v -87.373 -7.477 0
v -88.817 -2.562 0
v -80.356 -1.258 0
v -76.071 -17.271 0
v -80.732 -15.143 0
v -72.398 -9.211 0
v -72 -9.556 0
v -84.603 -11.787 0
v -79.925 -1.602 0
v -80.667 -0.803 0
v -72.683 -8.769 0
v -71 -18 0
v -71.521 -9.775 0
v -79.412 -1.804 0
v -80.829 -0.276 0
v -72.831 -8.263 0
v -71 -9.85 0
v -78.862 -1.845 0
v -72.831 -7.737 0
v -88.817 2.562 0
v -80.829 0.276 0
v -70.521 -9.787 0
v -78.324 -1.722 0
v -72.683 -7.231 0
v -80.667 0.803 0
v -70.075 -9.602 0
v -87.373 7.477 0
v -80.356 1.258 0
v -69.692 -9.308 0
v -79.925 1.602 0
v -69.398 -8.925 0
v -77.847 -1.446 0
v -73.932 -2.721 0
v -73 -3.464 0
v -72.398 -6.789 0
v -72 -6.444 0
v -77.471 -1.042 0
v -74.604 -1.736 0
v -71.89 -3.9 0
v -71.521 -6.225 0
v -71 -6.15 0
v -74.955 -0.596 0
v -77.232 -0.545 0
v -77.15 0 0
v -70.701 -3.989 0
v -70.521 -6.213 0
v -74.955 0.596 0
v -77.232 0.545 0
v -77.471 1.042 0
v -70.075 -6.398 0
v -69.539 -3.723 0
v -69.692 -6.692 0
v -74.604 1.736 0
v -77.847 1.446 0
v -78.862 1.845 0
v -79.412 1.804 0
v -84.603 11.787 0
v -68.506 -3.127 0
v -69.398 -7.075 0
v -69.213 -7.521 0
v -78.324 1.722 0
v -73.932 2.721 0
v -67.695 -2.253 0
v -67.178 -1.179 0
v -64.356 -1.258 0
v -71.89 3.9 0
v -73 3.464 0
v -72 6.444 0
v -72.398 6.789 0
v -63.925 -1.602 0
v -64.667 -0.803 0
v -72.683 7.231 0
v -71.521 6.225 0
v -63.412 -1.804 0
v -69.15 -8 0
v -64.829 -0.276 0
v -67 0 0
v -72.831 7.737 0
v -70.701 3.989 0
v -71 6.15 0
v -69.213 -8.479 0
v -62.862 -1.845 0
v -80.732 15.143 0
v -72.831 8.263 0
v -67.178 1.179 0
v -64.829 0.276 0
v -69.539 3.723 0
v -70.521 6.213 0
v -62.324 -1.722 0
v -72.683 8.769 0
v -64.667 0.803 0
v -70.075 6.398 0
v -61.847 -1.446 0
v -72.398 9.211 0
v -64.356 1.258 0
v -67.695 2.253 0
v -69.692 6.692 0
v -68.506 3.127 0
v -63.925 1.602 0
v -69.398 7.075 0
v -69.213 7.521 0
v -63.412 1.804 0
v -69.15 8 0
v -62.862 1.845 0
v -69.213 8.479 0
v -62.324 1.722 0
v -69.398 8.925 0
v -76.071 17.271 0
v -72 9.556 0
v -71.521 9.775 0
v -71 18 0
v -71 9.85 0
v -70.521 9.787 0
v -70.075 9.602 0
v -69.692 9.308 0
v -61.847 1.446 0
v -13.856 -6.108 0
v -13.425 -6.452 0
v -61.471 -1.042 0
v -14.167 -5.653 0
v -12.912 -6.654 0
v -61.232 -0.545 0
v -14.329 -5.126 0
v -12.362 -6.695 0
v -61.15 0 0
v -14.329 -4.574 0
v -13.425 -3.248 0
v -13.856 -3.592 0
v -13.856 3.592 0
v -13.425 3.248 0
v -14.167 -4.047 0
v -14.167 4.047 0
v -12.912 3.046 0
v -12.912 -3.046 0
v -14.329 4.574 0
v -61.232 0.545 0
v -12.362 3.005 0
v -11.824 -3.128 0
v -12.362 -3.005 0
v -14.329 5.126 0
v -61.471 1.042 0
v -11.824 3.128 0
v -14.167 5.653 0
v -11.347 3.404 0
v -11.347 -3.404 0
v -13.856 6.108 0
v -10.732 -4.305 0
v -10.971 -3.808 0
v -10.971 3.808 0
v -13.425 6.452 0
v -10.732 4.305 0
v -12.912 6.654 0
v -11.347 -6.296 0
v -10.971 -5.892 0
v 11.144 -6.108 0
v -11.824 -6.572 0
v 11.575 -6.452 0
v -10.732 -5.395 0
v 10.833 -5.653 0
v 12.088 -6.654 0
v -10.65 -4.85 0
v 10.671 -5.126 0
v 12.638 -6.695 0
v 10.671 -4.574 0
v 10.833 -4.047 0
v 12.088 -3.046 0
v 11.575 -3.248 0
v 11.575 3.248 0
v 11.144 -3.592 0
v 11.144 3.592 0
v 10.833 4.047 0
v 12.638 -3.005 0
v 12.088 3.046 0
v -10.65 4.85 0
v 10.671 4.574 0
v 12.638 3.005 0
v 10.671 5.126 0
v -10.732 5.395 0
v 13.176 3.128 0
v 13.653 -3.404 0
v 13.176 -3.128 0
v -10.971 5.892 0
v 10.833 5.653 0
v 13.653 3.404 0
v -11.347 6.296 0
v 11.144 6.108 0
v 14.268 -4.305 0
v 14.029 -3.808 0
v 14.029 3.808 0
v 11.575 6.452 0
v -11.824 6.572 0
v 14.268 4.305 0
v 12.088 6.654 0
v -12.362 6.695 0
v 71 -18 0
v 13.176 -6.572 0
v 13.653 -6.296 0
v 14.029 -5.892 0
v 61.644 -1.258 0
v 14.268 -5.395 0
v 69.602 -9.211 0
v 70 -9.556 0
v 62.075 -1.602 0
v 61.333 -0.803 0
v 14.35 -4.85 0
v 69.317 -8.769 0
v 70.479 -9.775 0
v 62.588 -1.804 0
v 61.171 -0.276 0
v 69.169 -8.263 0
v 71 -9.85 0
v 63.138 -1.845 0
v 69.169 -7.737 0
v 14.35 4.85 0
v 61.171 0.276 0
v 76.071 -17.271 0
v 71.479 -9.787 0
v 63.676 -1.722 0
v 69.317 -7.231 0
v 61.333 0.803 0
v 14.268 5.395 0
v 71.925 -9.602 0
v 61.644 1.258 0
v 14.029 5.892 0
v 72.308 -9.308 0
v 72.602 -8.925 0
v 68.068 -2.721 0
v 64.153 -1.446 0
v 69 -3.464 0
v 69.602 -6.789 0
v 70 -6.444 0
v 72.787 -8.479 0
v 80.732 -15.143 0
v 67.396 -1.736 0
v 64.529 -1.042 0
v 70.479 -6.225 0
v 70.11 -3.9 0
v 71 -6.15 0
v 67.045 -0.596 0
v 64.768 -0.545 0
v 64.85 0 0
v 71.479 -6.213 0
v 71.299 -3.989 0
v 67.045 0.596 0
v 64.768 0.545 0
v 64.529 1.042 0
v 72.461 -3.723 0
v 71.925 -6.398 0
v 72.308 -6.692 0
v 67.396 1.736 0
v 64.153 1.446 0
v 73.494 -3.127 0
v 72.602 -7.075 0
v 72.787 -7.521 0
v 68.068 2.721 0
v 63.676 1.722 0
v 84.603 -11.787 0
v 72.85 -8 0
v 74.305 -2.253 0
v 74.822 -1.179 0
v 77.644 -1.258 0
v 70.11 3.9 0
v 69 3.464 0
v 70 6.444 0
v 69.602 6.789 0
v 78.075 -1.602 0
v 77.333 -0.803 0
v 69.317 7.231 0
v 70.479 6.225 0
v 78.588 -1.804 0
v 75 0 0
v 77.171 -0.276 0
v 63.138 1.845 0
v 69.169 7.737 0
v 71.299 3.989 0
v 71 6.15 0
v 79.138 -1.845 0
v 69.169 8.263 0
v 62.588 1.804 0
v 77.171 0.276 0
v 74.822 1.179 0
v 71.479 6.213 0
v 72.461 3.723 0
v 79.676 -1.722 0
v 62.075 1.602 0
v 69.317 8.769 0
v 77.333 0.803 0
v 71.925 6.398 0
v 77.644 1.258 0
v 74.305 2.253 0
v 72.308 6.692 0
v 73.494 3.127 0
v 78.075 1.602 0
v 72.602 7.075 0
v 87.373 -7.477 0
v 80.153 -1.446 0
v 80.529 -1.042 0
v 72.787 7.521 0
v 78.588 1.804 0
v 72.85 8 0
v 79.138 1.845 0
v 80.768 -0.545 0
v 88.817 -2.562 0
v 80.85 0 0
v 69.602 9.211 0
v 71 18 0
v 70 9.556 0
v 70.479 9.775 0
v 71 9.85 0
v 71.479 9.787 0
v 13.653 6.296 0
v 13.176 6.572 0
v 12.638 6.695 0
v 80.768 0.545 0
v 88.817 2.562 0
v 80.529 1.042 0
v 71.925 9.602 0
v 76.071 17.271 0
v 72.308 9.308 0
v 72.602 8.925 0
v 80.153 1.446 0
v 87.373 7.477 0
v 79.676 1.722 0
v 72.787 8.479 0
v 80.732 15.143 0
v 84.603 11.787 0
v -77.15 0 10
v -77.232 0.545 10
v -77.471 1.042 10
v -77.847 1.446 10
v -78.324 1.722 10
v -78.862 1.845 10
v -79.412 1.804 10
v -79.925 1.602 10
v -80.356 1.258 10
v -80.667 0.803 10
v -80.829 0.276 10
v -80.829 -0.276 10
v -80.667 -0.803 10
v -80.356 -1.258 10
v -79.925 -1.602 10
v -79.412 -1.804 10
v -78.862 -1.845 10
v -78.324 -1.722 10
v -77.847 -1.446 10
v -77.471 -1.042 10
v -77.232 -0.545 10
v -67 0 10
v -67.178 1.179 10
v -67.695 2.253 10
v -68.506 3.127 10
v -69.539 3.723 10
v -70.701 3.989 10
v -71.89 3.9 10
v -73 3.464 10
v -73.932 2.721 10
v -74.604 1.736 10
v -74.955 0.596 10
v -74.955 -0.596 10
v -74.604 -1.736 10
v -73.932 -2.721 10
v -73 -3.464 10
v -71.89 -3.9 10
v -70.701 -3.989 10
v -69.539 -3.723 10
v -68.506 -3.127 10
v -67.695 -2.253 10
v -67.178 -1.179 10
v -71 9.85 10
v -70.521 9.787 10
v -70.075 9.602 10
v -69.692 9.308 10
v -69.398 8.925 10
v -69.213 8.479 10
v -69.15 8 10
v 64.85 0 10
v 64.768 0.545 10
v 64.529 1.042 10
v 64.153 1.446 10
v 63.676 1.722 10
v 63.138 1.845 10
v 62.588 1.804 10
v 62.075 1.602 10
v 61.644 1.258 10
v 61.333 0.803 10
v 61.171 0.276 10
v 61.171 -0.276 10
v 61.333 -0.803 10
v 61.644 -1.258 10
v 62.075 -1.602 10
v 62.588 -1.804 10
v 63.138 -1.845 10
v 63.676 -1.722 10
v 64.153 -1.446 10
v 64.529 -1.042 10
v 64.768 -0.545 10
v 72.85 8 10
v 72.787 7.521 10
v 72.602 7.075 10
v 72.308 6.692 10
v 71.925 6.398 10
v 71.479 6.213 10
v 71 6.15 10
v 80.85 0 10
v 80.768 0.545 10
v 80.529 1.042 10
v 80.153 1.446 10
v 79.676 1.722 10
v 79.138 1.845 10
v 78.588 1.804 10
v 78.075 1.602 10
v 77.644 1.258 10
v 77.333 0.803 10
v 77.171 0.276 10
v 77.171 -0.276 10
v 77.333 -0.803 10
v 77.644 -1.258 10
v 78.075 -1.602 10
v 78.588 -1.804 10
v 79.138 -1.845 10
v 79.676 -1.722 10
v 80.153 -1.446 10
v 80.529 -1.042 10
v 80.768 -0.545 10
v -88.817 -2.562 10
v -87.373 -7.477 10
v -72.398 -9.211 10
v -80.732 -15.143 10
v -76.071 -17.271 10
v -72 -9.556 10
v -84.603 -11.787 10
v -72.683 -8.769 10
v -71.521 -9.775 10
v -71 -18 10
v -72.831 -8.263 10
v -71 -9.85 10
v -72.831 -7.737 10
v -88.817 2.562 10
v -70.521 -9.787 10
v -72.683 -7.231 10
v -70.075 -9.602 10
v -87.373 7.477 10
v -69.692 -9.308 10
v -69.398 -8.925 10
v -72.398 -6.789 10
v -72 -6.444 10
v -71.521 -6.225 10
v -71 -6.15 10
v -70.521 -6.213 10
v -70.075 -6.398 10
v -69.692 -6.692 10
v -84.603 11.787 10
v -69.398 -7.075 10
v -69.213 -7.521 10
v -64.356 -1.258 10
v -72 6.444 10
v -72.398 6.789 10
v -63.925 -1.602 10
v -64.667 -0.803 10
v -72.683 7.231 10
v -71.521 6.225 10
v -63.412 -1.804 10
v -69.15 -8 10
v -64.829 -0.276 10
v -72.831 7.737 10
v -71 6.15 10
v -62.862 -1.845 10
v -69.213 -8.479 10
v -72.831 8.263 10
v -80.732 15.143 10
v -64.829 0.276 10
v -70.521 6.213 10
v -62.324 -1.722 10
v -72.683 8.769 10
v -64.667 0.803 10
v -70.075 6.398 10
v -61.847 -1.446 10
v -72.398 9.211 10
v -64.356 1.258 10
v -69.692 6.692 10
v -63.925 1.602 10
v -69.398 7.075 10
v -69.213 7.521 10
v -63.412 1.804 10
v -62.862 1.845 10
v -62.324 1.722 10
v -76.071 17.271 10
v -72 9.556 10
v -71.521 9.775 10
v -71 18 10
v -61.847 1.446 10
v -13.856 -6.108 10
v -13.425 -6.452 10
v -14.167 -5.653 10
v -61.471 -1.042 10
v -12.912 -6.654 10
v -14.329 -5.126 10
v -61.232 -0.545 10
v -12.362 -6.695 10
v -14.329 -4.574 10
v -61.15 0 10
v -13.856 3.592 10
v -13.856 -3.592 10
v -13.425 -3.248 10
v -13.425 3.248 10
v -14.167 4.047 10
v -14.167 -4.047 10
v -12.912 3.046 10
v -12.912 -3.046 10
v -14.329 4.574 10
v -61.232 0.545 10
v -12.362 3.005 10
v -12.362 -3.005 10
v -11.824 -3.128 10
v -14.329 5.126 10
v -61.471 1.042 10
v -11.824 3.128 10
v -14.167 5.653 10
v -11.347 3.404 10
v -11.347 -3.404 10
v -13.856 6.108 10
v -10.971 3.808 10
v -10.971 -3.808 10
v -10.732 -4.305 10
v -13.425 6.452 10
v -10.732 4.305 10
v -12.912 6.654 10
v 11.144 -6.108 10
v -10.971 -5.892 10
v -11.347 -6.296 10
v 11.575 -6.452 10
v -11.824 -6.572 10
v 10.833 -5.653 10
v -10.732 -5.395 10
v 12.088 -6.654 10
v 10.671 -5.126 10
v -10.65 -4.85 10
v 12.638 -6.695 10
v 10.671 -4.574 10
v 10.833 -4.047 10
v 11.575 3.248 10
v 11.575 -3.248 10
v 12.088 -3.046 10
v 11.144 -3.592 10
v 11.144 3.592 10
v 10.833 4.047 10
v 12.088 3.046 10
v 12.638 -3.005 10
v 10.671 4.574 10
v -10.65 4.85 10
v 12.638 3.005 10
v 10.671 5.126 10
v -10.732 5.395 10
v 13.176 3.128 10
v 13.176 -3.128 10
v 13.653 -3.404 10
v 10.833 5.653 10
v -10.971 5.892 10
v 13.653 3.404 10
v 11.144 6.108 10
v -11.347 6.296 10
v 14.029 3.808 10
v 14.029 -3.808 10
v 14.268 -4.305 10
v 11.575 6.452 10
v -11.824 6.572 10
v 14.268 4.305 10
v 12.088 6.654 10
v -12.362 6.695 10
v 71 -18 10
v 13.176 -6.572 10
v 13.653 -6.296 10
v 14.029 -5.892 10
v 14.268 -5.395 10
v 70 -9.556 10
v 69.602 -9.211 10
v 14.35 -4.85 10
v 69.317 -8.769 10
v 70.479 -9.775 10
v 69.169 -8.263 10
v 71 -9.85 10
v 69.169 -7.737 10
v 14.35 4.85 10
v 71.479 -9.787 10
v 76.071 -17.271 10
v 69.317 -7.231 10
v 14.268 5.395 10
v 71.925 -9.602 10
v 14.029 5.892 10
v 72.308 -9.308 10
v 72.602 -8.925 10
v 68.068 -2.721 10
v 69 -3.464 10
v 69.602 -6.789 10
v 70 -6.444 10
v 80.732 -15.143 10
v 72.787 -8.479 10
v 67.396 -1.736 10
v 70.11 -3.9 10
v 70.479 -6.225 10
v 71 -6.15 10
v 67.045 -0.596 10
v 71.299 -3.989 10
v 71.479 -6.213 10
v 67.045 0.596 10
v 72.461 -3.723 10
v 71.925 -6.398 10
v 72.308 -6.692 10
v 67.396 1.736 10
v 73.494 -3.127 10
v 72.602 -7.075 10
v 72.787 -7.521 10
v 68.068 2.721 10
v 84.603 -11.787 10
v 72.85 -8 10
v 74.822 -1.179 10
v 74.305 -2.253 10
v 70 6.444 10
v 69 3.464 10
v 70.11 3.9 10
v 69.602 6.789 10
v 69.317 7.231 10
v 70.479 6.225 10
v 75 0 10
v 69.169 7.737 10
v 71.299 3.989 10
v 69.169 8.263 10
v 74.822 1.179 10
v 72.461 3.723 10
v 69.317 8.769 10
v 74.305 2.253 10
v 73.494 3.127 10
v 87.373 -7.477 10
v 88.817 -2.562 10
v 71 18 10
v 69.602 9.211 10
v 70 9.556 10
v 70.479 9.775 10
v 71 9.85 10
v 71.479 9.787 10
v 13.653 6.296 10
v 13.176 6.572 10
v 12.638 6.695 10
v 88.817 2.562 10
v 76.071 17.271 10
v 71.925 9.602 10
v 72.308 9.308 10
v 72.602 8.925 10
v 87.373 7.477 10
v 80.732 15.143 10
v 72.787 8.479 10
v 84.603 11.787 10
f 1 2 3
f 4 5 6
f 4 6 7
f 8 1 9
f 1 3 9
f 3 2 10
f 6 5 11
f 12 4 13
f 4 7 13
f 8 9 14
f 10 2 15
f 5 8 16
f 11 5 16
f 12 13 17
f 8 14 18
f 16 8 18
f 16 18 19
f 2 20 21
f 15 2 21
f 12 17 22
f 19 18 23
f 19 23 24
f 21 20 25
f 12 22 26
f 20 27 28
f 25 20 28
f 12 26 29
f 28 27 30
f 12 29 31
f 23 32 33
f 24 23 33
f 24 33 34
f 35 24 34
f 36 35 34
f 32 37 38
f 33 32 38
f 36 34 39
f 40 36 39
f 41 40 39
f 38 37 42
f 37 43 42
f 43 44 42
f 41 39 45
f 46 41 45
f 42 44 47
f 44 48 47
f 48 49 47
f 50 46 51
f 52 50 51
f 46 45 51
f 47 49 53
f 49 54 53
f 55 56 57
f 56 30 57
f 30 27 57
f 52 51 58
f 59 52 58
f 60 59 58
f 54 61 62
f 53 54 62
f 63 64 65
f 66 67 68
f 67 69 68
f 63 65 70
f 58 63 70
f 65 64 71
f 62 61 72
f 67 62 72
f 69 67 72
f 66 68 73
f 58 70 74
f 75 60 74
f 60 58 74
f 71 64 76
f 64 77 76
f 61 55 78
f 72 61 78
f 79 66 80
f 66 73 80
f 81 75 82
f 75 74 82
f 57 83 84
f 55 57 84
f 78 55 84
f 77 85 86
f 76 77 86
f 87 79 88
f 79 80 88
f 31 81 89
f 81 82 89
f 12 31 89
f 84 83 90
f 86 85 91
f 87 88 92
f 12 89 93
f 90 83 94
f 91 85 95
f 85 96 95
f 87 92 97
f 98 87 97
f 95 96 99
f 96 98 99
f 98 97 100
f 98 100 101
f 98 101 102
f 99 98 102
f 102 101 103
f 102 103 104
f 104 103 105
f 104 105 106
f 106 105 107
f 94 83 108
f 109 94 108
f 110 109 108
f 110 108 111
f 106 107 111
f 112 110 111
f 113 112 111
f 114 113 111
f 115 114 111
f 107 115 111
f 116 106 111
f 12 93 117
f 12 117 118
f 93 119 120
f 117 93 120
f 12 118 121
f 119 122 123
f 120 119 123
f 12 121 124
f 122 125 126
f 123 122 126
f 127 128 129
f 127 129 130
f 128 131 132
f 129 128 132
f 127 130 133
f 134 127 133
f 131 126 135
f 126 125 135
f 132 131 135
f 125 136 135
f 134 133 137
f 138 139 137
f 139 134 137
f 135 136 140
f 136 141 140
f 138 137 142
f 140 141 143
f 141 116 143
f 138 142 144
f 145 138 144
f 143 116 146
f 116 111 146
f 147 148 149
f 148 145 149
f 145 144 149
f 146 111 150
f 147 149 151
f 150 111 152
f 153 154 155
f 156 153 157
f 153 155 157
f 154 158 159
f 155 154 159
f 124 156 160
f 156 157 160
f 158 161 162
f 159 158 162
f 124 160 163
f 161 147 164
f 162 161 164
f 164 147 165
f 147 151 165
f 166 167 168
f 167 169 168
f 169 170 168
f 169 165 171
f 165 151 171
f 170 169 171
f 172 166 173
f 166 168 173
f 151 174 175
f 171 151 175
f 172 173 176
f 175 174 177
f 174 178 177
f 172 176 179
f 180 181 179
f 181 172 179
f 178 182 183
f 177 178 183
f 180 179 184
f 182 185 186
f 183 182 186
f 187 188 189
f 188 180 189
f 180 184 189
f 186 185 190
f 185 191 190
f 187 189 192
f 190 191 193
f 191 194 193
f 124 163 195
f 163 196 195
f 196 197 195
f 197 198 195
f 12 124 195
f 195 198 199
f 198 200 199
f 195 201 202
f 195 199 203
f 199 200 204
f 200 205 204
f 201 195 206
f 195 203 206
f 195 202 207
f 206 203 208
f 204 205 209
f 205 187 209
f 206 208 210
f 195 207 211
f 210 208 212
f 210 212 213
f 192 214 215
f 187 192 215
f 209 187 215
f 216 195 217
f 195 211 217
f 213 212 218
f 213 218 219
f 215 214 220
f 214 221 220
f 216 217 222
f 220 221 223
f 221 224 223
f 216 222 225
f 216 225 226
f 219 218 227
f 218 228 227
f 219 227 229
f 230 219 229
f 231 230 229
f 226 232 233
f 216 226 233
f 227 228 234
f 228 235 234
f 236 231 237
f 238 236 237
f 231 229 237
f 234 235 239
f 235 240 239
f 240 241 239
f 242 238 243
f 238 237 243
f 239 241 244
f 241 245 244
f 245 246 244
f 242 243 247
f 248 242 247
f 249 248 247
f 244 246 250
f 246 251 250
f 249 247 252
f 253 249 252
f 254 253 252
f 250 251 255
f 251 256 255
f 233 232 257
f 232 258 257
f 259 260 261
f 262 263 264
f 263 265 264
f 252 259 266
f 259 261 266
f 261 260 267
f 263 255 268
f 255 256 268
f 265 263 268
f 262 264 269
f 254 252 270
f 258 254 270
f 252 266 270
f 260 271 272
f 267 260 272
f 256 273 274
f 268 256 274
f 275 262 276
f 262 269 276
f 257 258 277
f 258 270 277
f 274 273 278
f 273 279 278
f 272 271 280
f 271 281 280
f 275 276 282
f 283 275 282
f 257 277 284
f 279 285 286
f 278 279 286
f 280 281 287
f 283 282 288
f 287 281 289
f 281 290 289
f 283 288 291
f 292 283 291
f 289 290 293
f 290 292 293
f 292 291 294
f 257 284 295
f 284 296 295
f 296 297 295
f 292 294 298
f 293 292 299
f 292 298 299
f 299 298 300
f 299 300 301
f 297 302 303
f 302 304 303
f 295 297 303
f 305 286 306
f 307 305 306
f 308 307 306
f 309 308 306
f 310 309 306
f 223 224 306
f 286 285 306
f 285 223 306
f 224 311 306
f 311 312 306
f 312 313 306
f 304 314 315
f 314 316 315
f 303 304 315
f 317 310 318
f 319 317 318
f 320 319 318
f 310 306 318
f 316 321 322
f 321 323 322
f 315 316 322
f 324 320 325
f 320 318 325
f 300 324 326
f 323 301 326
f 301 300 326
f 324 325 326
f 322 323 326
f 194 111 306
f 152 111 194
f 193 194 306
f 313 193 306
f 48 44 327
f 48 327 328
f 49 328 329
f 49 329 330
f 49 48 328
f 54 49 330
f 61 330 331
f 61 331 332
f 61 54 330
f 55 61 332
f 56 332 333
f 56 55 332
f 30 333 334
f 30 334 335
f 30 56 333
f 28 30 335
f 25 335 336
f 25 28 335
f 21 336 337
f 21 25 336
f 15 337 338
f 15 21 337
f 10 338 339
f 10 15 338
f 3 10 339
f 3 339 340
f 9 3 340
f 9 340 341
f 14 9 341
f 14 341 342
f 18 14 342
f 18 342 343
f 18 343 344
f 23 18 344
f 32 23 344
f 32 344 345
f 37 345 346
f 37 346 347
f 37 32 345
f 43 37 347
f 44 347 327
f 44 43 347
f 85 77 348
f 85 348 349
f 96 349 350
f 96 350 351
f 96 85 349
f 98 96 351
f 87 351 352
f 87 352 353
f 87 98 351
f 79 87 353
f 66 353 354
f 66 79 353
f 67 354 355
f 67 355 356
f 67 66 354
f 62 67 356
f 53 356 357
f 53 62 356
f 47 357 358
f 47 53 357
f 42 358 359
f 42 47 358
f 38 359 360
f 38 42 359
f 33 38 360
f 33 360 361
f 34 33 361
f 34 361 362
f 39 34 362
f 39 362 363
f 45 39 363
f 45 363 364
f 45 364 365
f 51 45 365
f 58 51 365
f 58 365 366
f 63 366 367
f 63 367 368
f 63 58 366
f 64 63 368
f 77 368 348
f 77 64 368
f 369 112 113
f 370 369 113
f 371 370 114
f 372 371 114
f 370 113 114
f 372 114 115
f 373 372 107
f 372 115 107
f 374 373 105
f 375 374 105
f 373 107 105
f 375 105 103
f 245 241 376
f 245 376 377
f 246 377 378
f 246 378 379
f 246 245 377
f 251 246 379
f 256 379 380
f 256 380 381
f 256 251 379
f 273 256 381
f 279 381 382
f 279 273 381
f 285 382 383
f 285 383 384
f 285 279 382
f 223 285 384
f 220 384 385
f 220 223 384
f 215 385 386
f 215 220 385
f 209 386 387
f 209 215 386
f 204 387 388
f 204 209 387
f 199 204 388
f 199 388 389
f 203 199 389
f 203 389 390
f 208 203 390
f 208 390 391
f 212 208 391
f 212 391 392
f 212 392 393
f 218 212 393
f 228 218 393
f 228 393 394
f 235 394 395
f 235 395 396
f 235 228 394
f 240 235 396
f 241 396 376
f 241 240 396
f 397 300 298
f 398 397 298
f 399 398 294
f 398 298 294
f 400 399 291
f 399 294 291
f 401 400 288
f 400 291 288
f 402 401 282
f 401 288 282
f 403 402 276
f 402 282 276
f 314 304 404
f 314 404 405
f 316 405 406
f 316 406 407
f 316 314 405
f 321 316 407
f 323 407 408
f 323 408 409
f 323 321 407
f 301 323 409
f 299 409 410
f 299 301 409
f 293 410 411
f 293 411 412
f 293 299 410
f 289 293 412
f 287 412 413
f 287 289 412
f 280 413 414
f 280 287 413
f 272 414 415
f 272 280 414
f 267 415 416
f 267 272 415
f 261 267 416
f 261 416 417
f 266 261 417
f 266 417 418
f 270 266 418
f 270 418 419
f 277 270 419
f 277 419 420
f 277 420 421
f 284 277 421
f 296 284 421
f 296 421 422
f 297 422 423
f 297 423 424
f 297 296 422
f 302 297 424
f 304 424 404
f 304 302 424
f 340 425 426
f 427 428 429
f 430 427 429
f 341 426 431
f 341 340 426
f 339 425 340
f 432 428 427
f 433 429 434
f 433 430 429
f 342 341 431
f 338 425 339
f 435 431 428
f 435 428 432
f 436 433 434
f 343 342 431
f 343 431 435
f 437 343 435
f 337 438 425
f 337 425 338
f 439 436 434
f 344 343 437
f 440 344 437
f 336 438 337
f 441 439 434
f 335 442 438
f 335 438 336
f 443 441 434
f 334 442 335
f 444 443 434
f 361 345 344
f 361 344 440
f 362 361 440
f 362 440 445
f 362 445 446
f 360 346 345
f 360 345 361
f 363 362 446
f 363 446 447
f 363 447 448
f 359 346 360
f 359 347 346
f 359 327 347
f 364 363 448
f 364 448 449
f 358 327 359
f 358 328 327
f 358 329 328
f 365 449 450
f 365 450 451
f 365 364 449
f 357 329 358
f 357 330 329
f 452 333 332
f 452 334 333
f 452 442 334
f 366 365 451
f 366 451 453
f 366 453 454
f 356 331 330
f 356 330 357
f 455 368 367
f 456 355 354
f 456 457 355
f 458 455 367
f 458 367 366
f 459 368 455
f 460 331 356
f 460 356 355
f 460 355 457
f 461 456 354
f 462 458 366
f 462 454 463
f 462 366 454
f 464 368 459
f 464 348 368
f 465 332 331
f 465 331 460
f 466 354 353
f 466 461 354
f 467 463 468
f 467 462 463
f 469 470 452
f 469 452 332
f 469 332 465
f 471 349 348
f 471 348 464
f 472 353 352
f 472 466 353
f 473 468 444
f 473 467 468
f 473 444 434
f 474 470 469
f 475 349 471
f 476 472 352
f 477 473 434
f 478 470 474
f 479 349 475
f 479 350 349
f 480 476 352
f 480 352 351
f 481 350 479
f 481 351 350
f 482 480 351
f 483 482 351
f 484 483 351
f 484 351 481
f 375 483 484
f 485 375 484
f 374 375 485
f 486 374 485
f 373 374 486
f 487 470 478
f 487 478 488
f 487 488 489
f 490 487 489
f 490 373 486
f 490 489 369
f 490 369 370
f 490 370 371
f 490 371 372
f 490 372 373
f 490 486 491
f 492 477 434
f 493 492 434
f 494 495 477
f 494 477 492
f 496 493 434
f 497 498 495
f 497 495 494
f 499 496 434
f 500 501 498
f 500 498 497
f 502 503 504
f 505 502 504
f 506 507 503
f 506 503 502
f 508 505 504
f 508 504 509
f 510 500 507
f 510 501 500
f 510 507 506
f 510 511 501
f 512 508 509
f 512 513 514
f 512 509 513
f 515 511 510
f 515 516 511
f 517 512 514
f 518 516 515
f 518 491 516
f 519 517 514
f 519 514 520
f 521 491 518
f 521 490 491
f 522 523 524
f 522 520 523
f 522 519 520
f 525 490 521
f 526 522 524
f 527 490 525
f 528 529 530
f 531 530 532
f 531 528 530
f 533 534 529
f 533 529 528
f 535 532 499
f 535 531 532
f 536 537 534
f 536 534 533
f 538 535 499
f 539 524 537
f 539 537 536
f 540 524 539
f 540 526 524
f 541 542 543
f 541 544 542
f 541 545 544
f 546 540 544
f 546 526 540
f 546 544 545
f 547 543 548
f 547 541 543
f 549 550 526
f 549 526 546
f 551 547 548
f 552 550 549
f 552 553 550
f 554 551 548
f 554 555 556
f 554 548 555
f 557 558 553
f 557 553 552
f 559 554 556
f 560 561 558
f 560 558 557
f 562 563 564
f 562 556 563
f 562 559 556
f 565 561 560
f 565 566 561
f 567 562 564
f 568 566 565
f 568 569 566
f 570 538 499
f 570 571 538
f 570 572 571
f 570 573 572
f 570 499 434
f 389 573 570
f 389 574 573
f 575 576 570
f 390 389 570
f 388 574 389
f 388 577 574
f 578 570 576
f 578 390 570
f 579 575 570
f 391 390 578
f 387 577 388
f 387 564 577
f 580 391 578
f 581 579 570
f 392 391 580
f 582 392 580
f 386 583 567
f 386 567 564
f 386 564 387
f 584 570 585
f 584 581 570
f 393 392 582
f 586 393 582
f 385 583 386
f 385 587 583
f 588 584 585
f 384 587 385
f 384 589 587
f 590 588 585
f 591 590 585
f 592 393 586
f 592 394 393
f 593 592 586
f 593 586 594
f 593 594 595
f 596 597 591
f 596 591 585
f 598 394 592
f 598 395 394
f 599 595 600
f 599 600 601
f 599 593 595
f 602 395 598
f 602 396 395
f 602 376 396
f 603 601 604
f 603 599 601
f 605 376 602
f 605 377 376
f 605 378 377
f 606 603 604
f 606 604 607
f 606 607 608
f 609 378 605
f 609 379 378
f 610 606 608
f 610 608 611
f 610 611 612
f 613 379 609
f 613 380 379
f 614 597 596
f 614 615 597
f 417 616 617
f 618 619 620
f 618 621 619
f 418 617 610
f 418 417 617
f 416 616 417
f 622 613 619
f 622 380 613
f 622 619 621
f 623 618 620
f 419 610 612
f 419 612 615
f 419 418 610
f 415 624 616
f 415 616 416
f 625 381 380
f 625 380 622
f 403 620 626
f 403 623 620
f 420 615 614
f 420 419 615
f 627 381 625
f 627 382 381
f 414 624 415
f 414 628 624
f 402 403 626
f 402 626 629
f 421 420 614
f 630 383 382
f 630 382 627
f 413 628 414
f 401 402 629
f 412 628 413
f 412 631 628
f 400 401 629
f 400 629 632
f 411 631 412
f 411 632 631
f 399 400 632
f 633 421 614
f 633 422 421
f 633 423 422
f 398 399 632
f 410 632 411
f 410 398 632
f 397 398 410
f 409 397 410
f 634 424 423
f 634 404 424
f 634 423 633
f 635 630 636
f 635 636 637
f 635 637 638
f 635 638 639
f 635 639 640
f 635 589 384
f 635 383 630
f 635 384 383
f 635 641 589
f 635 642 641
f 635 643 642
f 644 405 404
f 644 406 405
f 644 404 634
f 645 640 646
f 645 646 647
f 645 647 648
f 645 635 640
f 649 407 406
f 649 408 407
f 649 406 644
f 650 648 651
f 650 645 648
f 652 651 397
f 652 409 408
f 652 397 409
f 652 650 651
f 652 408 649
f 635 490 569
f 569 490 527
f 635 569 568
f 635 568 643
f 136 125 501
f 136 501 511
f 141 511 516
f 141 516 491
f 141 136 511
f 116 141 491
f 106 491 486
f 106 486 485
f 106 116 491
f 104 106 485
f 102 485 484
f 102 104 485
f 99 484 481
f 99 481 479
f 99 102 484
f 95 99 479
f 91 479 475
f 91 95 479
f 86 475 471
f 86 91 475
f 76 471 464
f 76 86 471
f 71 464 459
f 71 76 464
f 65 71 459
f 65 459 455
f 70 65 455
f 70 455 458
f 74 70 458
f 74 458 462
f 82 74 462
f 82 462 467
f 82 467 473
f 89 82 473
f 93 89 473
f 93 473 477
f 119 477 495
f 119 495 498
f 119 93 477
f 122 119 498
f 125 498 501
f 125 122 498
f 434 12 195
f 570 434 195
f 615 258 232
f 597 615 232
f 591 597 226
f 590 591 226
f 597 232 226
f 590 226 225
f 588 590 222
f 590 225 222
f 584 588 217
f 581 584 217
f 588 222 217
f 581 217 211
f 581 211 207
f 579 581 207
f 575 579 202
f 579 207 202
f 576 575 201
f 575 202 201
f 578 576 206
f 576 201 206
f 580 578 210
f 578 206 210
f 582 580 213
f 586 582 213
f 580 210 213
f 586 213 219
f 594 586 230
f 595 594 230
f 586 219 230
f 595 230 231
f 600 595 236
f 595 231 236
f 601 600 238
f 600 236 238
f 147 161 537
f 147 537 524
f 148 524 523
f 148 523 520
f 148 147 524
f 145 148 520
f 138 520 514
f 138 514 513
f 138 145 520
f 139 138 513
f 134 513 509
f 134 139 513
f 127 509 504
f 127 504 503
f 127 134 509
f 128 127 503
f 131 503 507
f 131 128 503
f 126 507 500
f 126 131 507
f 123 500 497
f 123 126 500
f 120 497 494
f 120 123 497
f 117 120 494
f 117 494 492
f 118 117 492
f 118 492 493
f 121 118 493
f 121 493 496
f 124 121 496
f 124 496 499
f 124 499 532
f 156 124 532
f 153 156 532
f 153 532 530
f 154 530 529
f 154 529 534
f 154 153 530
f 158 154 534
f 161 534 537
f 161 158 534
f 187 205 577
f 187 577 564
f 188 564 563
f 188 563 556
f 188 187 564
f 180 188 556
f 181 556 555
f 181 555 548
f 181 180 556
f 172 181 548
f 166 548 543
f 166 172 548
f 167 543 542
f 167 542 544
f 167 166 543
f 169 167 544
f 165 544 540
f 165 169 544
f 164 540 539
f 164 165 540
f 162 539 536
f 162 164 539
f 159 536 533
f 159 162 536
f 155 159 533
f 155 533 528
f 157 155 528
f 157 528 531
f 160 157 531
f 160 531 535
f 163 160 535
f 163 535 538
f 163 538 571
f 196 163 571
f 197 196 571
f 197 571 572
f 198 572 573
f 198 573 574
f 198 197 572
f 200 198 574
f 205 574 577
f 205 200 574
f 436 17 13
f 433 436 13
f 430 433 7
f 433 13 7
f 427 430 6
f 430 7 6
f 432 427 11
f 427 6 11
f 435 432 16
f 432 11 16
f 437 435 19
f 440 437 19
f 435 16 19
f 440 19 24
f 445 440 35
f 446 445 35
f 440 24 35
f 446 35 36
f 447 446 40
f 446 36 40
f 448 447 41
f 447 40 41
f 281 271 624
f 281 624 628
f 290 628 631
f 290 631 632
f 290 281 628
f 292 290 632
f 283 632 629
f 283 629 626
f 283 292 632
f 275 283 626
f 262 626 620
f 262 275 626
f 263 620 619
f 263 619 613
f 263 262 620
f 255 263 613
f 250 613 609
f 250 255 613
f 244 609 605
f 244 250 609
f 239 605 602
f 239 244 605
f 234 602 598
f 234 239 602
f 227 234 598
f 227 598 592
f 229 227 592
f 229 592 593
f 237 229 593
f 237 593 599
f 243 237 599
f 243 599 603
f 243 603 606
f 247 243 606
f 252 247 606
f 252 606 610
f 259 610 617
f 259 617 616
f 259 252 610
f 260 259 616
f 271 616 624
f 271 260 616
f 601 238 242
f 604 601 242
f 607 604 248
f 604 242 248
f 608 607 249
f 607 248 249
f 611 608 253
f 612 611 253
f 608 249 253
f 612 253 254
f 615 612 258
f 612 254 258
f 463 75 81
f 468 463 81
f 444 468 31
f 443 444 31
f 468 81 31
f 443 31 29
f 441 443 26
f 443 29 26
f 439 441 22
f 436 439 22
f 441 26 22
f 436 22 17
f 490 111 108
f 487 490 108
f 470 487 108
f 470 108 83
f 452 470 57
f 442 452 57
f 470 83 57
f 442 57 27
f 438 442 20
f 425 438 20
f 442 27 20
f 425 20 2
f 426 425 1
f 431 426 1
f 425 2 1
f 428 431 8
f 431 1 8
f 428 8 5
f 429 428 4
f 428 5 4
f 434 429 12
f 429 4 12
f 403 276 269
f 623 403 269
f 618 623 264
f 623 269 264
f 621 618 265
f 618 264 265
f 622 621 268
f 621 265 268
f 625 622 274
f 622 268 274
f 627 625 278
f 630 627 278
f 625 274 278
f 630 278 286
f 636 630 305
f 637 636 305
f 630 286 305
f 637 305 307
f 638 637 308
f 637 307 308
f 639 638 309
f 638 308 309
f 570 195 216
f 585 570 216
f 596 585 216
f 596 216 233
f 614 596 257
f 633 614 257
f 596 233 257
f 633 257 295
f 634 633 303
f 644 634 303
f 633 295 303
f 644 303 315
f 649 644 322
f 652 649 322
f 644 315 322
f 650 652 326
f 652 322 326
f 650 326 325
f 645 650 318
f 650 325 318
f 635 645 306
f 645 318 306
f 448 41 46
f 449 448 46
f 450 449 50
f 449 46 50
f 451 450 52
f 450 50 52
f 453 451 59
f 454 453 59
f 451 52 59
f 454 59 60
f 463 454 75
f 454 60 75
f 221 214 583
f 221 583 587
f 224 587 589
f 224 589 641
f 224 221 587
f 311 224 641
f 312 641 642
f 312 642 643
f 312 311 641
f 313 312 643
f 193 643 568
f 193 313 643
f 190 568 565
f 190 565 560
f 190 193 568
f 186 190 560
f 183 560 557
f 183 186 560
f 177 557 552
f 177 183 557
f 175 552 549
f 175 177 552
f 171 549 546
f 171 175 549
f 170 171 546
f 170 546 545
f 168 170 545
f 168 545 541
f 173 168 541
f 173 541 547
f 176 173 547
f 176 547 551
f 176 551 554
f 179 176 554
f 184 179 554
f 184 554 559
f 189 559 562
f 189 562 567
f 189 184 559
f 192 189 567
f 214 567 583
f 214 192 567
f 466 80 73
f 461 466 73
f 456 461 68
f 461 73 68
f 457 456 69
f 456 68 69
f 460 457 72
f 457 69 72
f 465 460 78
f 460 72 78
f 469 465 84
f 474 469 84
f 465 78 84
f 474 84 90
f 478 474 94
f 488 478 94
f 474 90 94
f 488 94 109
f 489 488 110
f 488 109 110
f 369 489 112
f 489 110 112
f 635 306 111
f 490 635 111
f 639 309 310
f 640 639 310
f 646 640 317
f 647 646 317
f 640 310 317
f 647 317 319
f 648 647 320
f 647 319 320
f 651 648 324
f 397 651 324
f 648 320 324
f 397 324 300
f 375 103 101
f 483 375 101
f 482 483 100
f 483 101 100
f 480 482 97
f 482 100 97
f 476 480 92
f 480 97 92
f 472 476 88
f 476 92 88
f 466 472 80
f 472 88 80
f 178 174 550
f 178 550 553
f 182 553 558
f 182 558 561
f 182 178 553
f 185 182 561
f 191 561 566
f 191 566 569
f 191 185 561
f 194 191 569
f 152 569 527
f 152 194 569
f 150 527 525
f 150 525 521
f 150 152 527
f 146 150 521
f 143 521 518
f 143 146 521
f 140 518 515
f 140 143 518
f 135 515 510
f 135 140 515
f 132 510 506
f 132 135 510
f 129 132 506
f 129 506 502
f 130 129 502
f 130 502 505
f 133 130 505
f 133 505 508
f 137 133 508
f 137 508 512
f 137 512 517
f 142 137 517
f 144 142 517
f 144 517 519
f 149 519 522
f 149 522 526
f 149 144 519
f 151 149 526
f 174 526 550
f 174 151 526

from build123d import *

# Parameters (mm, degrees)
F0_R     = 1.85
F0_R_2   = 4
F1_DEPTH = 10


with BuildPart() as f1:
    # F0 (on Top) → F1 (new body)
    with BuildSketch(Plane.XY):
        with BuildLine():
            Line((-71, -18), (71, -18))
            ThreePointArc((71, -18), (89, 0), (71, 18))
            Line((71, 18), (-71, 18))
            ThreePointArc((-71, 18), (-89, 0), (-71, -18))
        make_face()
        with BuildLine():
            ThreePointArc((-71, -6.15), (-69.691852, -6.691852), (-69.15, -8))
            ThreePointArc((-69.15, -8), (-69.691852, -9.308148), (-71, -9.85))
            ThreePointArc((-71, -9.85), (-72.85, -8), (-71, -6.15))
        make_face(mode=Mode.SUBTRACT)
        with Locations((-12.5, -4.85)):
            Circle(F0_R, mode=Mode.SUBTRACT)
        with Locations((12.5, -4.85)):
            Circle(F0_R, mode=Mode.SUBTRACT)
        with BuildLine():
            ThreePointArc((71, -6.15), (72.308148, -6.691852), (72.85, -8))
            ThreePointArc((72.85, -8), (72.308148, -9.308148), (71, -9.85))
            ThreePointArc((71, -9.85), (69.15, -8), (71, -6.15))
        make_face(mode=Mode.SUBTRACT)
        with Locations((-79, 0)):
            Circle(F0_R, mode=Mode.SUBTRACT)
        with Locations((-71, 0)):
            Circle(F0_R_2, mode=Mode.SUBTRACT)
        with Locations((-63, 0)):
            Circle(F0_R, mode=Mode.SUBTRACT)
        with BuildLine():
            ThreePointArc((-71, 9.85), (-69.691852, 9.308148), (-69.15, 8))
            ThreePointArc((-69.15, 8), (-69.691852, 6.691852), (-71, 6.15))
            ThreePointArc((-71, 6.15), (-72.85, 8), (-71, 9.85))
        make_face(mode=Mode.SUBTRACT)
        with Locations((-12.5, 4.85)):
            Circle(F0_R, mode=Mode.SUBTRACT)
        with Locations((12.5, 4.85)):
            Circle(F0_R, mode=Mode.SUBTRACT)
        with Locations((63, 0)):
            Circle(F0_R, mode=Mode.SUBTRACT)
        with Locations((71, 0)):
            Circle(F0_R_2, mode=Mode.SUBTRACT)
        with Locations((79, 0)):
            Circle(F0_R, mode=Mode.SUBTRACT)
        with BuildLine():
            ThreePointArc((71, 9.85), (72.308148, 9.308148), (72.85, 8))
            ThreePointArc((72.85, 8), (72.308148, 6.691852), (71, 6.15))
            ThreePointArc((71, 6.15), (69.15, 8), (71, 9.85))
        make_face(mode=Mode.SUBTRACT)
    extrude(amount=F1_DEPTH)


solid = f1.part
